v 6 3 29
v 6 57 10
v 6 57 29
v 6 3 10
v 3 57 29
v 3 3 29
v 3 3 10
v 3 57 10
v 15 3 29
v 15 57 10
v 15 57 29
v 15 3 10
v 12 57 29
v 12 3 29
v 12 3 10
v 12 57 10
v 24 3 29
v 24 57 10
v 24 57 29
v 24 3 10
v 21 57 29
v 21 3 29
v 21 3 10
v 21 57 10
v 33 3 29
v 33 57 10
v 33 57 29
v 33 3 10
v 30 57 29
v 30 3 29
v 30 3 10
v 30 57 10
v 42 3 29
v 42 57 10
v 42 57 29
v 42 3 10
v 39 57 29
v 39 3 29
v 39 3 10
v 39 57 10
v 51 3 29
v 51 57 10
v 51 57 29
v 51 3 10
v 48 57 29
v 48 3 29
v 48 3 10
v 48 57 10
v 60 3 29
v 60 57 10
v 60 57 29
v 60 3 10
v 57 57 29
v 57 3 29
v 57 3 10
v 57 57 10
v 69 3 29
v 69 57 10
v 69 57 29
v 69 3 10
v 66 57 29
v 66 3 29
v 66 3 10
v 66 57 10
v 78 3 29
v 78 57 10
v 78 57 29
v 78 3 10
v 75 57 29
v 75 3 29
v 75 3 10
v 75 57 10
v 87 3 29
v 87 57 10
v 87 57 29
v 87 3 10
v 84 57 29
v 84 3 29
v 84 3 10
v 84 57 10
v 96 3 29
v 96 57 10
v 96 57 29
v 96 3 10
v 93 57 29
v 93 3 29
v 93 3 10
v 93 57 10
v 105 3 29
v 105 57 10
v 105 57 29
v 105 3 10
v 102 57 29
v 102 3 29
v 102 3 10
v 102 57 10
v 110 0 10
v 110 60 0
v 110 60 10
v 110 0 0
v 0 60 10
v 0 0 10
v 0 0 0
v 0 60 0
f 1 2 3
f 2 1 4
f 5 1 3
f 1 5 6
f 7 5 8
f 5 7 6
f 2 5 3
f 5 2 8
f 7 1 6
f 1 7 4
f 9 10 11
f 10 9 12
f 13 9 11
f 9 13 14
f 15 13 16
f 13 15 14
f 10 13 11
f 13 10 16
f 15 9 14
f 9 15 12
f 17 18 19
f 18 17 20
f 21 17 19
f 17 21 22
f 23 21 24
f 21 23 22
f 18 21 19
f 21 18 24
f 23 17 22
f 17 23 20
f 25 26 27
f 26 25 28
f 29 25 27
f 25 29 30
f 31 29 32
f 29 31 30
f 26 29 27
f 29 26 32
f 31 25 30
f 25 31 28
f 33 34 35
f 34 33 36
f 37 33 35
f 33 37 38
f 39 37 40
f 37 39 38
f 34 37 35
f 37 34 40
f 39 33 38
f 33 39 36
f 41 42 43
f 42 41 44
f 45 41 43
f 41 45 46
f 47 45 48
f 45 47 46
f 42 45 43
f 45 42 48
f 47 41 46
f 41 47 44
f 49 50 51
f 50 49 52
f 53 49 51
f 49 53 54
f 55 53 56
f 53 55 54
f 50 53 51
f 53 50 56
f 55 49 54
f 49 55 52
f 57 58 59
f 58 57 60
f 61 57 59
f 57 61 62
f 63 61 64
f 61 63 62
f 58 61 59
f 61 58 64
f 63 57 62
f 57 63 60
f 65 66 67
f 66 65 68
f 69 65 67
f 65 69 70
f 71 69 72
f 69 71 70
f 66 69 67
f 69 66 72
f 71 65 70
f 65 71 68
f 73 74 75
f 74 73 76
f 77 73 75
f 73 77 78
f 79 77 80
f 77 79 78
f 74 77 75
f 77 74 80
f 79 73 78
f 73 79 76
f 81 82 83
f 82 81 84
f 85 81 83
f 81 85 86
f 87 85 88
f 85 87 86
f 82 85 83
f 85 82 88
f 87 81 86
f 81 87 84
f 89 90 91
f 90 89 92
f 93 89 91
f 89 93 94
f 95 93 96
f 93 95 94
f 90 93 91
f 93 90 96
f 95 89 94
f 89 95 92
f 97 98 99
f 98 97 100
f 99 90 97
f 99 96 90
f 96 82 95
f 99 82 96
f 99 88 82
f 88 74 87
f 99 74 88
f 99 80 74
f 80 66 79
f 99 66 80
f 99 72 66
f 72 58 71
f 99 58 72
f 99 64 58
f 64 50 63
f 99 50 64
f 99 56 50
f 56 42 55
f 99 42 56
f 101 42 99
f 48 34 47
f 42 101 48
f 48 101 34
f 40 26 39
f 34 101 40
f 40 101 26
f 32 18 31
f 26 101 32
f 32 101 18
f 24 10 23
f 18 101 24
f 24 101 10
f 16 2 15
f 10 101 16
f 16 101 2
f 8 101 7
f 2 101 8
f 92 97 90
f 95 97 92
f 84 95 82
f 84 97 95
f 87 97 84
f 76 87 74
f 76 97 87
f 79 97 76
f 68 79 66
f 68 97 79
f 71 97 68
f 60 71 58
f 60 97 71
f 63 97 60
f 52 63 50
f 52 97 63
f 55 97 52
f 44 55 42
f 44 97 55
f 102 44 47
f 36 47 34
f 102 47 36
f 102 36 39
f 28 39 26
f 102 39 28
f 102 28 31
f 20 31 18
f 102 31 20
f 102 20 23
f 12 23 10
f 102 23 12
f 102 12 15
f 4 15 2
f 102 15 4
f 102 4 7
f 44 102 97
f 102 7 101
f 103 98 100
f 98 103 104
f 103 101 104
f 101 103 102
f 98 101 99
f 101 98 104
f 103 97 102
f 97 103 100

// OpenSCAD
$fn = 32;

// ----------------------------------------------------------------------
// Heatsink: uniform fin block
// ----------------------------------------------------------------------

// --- parameters (mm) ---
base_l = 110;             // base length, X
base_w = 60;              // base width, Y
base_t = 10;              // base plate thickness
fin_h = 20;               // fin height above the base
fin_t = 3;                // fin thickness
edge = 3;                 // margin from the base ends
pitch = 9;                // fin pitch
fit_tol = 0.1;            // tolerance for press fits, mm
free_tol = 0.5;           // tolerance for clearance fits, mm

n_fins = floor((base_l - 2 * edge - fin_t) / pitch) + 1;  // fin count
total_h = base_t + fin_h - 1;  // overall height

union() {
  cube([base_l, base_w, base_t]);
  for (i = [0 : n_fins - 1])
    translate([edge + i * pitch, edge, base_t - 1])
      cube([fin_t, base_w - 2 * edge, fin_h]);
}
